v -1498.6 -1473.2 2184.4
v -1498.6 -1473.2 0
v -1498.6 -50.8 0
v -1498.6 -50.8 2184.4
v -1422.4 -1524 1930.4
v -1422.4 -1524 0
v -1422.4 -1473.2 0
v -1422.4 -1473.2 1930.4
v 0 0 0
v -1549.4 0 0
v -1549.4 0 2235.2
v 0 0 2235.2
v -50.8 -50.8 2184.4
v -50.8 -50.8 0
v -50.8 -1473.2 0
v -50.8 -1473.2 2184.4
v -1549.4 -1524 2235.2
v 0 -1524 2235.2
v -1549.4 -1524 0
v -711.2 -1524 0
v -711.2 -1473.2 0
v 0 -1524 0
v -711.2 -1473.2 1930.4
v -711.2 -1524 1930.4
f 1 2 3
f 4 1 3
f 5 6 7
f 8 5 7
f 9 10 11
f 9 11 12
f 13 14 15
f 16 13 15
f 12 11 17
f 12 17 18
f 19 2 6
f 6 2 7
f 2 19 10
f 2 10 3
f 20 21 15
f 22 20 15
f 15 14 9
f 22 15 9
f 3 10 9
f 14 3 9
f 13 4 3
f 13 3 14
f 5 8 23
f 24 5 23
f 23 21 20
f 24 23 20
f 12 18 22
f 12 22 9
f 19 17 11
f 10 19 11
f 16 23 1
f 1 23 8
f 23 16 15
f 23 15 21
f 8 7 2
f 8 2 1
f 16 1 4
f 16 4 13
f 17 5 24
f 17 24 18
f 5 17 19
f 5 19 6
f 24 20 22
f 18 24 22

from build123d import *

# Parameters (mm, degrees)
F1_DEPTH = 1930.4
F2_W     = 1549.4
F2_H     = 1524
F3_DEPTH = 304.8
F4_W     = 1447.8
F4_H     = 1422.4
F5_DEPTH = 254


with BuildPart() as f1:
    # F0 (on Top) → F1 (new body)
    with BuildSketch(Plane.XY):
        Polygon((0, -1524), (0, 0), (-1549.4, 0), (-1549.4, -1524), (-1422.4, -1524), (-1422.4, -1473.2), (-1498.6, -1473.2), (-1498.6, -50.8), (-50.8, -50.8), (-50.8, -1473.2), (-711.2, -1473.2), (-711.2, -1524), align=None)
    extrude(amount=F1_DEPTH)

    # F2 (on face) → F3 (join)
    with BuildSketch(Plane.XY.offset(1930.4)):
        with Locations((-774.7, -762)):
            Rectangle(F2_W, F2_H)
    extrude(amount=F3_DEPTH)

    # F4 (on face) → F5 (cut)
    with BuildSketch(Plane(origin=(0, 0, 1930.4), x_dir=(1, 0, 0), z_dir=(0, 0, -1))):
        with Locations((-774.7, 762)):
            Rectangle(F4_W, F4_H)
    extrude(amount=-F5_DEPTH, mode=Mode.SUBTRACT)


solid = f1.part
